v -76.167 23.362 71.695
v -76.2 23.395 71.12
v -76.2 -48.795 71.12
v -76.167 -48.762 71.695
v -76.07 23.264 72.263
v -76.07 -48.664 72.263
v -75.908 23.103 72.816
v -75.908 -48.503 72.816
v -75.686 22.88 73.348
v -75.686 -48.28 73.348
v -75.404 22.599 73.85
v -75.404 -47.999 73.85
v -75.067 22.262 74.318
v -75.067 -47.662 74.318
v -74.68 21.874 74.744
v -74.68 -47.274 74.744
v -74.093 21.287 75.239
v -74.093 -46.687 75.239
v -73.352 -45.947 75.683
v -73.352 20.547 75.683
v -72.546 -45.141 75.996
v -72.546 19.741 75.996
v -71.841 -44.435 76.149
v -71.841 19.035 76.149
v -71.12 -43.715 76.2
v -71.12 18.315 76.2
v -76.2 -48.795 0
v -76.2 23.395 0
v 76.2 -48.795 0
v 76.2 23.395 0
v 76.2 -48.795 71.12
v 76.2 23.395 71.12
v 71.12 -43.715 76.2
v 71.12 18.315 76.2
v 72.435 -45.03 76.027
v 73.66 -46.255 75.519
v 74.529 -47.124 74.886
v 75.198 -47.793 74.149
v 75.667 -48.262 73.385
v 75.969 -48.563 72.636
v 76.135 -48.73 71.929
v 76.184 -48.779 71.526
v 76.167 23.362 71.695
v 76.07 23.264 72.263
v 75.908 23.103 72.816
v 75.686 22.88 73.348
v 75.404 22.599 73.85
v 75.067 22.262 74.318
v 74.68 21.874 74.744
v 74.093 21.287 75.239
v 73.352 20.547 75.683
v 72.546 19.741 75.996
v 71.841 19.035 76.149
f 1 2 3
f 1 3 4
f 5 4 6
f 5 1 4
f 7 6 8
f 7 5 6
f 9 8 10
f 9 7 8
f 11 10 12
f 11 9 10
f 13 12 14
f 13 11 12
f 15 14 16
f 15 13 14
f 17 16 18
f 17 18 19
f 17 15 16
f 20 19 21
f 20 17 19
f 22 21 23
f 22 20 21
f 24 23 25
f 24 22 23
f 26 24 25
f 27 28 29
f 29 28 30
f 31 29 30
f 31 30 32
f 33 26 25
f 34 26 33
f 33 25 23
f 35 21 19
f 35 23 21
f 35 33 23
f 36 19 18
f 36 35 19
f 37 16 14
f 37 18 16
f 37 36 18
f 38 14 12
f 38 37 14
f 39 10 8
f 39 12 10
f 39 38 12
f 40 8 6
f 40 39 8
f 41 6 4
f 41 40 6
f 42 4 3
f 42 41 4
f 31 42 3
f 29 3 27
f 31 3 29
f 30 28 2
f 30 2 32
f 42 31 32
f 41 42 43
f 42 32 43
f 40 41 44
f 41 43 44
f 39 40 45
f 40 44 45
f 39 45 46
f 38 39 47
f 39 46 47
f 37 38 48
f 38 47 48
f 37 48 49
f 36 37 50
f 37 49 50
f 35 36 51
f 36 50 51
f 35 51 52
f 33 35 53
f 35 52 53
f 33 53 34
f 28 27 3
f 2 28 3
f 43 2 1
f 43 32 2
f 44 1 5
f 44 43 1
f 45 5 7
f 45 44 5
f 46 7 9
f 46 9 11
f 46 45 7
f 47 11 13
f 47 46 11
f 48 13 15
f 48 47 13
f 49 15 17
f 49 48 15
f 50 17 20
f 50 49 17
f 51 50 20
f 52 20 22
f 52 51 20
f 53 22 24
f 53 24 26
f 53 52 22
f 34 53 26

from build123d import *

# Parameters (mm, degrees)
F0_W     = 152.4
F0_H     = 46.7894710547
F1_DEPTH = 76.2
F2_W     = 152.4
F2_H     = 76.2
F3_DEPTH = 25.4
F4_R     = 5.08


with BuildPart() as f1:
    # F0 (on Top) → F1 (new body)
    with BuildSketch(Plane.XY):
        Rectangle(F0_W, F0_H)
    extrude(amount=F1_DEPTH)

    # F2 (on face) → F3 (join)
    with BuildSketch(Plane.XZ.offset(23.3947355273)):
        with Locations((0, 38.1)):
            Rectangle(F2_W, F2_H)
    extrude(amount=F3_DEPTH)

    # F4
    f4_edges = [f1.edges().sort_by_distance(p)[0] for p in [
        (0, 23.394736, 76.2),
        (-76.2, -12.7, 76.2),
        (0, -48.794736, 76.2),
        (76.2, -12.7, 76.2),
    ]]
    fillet(f4_edges, radius=F4_R)


solid = f1.part
